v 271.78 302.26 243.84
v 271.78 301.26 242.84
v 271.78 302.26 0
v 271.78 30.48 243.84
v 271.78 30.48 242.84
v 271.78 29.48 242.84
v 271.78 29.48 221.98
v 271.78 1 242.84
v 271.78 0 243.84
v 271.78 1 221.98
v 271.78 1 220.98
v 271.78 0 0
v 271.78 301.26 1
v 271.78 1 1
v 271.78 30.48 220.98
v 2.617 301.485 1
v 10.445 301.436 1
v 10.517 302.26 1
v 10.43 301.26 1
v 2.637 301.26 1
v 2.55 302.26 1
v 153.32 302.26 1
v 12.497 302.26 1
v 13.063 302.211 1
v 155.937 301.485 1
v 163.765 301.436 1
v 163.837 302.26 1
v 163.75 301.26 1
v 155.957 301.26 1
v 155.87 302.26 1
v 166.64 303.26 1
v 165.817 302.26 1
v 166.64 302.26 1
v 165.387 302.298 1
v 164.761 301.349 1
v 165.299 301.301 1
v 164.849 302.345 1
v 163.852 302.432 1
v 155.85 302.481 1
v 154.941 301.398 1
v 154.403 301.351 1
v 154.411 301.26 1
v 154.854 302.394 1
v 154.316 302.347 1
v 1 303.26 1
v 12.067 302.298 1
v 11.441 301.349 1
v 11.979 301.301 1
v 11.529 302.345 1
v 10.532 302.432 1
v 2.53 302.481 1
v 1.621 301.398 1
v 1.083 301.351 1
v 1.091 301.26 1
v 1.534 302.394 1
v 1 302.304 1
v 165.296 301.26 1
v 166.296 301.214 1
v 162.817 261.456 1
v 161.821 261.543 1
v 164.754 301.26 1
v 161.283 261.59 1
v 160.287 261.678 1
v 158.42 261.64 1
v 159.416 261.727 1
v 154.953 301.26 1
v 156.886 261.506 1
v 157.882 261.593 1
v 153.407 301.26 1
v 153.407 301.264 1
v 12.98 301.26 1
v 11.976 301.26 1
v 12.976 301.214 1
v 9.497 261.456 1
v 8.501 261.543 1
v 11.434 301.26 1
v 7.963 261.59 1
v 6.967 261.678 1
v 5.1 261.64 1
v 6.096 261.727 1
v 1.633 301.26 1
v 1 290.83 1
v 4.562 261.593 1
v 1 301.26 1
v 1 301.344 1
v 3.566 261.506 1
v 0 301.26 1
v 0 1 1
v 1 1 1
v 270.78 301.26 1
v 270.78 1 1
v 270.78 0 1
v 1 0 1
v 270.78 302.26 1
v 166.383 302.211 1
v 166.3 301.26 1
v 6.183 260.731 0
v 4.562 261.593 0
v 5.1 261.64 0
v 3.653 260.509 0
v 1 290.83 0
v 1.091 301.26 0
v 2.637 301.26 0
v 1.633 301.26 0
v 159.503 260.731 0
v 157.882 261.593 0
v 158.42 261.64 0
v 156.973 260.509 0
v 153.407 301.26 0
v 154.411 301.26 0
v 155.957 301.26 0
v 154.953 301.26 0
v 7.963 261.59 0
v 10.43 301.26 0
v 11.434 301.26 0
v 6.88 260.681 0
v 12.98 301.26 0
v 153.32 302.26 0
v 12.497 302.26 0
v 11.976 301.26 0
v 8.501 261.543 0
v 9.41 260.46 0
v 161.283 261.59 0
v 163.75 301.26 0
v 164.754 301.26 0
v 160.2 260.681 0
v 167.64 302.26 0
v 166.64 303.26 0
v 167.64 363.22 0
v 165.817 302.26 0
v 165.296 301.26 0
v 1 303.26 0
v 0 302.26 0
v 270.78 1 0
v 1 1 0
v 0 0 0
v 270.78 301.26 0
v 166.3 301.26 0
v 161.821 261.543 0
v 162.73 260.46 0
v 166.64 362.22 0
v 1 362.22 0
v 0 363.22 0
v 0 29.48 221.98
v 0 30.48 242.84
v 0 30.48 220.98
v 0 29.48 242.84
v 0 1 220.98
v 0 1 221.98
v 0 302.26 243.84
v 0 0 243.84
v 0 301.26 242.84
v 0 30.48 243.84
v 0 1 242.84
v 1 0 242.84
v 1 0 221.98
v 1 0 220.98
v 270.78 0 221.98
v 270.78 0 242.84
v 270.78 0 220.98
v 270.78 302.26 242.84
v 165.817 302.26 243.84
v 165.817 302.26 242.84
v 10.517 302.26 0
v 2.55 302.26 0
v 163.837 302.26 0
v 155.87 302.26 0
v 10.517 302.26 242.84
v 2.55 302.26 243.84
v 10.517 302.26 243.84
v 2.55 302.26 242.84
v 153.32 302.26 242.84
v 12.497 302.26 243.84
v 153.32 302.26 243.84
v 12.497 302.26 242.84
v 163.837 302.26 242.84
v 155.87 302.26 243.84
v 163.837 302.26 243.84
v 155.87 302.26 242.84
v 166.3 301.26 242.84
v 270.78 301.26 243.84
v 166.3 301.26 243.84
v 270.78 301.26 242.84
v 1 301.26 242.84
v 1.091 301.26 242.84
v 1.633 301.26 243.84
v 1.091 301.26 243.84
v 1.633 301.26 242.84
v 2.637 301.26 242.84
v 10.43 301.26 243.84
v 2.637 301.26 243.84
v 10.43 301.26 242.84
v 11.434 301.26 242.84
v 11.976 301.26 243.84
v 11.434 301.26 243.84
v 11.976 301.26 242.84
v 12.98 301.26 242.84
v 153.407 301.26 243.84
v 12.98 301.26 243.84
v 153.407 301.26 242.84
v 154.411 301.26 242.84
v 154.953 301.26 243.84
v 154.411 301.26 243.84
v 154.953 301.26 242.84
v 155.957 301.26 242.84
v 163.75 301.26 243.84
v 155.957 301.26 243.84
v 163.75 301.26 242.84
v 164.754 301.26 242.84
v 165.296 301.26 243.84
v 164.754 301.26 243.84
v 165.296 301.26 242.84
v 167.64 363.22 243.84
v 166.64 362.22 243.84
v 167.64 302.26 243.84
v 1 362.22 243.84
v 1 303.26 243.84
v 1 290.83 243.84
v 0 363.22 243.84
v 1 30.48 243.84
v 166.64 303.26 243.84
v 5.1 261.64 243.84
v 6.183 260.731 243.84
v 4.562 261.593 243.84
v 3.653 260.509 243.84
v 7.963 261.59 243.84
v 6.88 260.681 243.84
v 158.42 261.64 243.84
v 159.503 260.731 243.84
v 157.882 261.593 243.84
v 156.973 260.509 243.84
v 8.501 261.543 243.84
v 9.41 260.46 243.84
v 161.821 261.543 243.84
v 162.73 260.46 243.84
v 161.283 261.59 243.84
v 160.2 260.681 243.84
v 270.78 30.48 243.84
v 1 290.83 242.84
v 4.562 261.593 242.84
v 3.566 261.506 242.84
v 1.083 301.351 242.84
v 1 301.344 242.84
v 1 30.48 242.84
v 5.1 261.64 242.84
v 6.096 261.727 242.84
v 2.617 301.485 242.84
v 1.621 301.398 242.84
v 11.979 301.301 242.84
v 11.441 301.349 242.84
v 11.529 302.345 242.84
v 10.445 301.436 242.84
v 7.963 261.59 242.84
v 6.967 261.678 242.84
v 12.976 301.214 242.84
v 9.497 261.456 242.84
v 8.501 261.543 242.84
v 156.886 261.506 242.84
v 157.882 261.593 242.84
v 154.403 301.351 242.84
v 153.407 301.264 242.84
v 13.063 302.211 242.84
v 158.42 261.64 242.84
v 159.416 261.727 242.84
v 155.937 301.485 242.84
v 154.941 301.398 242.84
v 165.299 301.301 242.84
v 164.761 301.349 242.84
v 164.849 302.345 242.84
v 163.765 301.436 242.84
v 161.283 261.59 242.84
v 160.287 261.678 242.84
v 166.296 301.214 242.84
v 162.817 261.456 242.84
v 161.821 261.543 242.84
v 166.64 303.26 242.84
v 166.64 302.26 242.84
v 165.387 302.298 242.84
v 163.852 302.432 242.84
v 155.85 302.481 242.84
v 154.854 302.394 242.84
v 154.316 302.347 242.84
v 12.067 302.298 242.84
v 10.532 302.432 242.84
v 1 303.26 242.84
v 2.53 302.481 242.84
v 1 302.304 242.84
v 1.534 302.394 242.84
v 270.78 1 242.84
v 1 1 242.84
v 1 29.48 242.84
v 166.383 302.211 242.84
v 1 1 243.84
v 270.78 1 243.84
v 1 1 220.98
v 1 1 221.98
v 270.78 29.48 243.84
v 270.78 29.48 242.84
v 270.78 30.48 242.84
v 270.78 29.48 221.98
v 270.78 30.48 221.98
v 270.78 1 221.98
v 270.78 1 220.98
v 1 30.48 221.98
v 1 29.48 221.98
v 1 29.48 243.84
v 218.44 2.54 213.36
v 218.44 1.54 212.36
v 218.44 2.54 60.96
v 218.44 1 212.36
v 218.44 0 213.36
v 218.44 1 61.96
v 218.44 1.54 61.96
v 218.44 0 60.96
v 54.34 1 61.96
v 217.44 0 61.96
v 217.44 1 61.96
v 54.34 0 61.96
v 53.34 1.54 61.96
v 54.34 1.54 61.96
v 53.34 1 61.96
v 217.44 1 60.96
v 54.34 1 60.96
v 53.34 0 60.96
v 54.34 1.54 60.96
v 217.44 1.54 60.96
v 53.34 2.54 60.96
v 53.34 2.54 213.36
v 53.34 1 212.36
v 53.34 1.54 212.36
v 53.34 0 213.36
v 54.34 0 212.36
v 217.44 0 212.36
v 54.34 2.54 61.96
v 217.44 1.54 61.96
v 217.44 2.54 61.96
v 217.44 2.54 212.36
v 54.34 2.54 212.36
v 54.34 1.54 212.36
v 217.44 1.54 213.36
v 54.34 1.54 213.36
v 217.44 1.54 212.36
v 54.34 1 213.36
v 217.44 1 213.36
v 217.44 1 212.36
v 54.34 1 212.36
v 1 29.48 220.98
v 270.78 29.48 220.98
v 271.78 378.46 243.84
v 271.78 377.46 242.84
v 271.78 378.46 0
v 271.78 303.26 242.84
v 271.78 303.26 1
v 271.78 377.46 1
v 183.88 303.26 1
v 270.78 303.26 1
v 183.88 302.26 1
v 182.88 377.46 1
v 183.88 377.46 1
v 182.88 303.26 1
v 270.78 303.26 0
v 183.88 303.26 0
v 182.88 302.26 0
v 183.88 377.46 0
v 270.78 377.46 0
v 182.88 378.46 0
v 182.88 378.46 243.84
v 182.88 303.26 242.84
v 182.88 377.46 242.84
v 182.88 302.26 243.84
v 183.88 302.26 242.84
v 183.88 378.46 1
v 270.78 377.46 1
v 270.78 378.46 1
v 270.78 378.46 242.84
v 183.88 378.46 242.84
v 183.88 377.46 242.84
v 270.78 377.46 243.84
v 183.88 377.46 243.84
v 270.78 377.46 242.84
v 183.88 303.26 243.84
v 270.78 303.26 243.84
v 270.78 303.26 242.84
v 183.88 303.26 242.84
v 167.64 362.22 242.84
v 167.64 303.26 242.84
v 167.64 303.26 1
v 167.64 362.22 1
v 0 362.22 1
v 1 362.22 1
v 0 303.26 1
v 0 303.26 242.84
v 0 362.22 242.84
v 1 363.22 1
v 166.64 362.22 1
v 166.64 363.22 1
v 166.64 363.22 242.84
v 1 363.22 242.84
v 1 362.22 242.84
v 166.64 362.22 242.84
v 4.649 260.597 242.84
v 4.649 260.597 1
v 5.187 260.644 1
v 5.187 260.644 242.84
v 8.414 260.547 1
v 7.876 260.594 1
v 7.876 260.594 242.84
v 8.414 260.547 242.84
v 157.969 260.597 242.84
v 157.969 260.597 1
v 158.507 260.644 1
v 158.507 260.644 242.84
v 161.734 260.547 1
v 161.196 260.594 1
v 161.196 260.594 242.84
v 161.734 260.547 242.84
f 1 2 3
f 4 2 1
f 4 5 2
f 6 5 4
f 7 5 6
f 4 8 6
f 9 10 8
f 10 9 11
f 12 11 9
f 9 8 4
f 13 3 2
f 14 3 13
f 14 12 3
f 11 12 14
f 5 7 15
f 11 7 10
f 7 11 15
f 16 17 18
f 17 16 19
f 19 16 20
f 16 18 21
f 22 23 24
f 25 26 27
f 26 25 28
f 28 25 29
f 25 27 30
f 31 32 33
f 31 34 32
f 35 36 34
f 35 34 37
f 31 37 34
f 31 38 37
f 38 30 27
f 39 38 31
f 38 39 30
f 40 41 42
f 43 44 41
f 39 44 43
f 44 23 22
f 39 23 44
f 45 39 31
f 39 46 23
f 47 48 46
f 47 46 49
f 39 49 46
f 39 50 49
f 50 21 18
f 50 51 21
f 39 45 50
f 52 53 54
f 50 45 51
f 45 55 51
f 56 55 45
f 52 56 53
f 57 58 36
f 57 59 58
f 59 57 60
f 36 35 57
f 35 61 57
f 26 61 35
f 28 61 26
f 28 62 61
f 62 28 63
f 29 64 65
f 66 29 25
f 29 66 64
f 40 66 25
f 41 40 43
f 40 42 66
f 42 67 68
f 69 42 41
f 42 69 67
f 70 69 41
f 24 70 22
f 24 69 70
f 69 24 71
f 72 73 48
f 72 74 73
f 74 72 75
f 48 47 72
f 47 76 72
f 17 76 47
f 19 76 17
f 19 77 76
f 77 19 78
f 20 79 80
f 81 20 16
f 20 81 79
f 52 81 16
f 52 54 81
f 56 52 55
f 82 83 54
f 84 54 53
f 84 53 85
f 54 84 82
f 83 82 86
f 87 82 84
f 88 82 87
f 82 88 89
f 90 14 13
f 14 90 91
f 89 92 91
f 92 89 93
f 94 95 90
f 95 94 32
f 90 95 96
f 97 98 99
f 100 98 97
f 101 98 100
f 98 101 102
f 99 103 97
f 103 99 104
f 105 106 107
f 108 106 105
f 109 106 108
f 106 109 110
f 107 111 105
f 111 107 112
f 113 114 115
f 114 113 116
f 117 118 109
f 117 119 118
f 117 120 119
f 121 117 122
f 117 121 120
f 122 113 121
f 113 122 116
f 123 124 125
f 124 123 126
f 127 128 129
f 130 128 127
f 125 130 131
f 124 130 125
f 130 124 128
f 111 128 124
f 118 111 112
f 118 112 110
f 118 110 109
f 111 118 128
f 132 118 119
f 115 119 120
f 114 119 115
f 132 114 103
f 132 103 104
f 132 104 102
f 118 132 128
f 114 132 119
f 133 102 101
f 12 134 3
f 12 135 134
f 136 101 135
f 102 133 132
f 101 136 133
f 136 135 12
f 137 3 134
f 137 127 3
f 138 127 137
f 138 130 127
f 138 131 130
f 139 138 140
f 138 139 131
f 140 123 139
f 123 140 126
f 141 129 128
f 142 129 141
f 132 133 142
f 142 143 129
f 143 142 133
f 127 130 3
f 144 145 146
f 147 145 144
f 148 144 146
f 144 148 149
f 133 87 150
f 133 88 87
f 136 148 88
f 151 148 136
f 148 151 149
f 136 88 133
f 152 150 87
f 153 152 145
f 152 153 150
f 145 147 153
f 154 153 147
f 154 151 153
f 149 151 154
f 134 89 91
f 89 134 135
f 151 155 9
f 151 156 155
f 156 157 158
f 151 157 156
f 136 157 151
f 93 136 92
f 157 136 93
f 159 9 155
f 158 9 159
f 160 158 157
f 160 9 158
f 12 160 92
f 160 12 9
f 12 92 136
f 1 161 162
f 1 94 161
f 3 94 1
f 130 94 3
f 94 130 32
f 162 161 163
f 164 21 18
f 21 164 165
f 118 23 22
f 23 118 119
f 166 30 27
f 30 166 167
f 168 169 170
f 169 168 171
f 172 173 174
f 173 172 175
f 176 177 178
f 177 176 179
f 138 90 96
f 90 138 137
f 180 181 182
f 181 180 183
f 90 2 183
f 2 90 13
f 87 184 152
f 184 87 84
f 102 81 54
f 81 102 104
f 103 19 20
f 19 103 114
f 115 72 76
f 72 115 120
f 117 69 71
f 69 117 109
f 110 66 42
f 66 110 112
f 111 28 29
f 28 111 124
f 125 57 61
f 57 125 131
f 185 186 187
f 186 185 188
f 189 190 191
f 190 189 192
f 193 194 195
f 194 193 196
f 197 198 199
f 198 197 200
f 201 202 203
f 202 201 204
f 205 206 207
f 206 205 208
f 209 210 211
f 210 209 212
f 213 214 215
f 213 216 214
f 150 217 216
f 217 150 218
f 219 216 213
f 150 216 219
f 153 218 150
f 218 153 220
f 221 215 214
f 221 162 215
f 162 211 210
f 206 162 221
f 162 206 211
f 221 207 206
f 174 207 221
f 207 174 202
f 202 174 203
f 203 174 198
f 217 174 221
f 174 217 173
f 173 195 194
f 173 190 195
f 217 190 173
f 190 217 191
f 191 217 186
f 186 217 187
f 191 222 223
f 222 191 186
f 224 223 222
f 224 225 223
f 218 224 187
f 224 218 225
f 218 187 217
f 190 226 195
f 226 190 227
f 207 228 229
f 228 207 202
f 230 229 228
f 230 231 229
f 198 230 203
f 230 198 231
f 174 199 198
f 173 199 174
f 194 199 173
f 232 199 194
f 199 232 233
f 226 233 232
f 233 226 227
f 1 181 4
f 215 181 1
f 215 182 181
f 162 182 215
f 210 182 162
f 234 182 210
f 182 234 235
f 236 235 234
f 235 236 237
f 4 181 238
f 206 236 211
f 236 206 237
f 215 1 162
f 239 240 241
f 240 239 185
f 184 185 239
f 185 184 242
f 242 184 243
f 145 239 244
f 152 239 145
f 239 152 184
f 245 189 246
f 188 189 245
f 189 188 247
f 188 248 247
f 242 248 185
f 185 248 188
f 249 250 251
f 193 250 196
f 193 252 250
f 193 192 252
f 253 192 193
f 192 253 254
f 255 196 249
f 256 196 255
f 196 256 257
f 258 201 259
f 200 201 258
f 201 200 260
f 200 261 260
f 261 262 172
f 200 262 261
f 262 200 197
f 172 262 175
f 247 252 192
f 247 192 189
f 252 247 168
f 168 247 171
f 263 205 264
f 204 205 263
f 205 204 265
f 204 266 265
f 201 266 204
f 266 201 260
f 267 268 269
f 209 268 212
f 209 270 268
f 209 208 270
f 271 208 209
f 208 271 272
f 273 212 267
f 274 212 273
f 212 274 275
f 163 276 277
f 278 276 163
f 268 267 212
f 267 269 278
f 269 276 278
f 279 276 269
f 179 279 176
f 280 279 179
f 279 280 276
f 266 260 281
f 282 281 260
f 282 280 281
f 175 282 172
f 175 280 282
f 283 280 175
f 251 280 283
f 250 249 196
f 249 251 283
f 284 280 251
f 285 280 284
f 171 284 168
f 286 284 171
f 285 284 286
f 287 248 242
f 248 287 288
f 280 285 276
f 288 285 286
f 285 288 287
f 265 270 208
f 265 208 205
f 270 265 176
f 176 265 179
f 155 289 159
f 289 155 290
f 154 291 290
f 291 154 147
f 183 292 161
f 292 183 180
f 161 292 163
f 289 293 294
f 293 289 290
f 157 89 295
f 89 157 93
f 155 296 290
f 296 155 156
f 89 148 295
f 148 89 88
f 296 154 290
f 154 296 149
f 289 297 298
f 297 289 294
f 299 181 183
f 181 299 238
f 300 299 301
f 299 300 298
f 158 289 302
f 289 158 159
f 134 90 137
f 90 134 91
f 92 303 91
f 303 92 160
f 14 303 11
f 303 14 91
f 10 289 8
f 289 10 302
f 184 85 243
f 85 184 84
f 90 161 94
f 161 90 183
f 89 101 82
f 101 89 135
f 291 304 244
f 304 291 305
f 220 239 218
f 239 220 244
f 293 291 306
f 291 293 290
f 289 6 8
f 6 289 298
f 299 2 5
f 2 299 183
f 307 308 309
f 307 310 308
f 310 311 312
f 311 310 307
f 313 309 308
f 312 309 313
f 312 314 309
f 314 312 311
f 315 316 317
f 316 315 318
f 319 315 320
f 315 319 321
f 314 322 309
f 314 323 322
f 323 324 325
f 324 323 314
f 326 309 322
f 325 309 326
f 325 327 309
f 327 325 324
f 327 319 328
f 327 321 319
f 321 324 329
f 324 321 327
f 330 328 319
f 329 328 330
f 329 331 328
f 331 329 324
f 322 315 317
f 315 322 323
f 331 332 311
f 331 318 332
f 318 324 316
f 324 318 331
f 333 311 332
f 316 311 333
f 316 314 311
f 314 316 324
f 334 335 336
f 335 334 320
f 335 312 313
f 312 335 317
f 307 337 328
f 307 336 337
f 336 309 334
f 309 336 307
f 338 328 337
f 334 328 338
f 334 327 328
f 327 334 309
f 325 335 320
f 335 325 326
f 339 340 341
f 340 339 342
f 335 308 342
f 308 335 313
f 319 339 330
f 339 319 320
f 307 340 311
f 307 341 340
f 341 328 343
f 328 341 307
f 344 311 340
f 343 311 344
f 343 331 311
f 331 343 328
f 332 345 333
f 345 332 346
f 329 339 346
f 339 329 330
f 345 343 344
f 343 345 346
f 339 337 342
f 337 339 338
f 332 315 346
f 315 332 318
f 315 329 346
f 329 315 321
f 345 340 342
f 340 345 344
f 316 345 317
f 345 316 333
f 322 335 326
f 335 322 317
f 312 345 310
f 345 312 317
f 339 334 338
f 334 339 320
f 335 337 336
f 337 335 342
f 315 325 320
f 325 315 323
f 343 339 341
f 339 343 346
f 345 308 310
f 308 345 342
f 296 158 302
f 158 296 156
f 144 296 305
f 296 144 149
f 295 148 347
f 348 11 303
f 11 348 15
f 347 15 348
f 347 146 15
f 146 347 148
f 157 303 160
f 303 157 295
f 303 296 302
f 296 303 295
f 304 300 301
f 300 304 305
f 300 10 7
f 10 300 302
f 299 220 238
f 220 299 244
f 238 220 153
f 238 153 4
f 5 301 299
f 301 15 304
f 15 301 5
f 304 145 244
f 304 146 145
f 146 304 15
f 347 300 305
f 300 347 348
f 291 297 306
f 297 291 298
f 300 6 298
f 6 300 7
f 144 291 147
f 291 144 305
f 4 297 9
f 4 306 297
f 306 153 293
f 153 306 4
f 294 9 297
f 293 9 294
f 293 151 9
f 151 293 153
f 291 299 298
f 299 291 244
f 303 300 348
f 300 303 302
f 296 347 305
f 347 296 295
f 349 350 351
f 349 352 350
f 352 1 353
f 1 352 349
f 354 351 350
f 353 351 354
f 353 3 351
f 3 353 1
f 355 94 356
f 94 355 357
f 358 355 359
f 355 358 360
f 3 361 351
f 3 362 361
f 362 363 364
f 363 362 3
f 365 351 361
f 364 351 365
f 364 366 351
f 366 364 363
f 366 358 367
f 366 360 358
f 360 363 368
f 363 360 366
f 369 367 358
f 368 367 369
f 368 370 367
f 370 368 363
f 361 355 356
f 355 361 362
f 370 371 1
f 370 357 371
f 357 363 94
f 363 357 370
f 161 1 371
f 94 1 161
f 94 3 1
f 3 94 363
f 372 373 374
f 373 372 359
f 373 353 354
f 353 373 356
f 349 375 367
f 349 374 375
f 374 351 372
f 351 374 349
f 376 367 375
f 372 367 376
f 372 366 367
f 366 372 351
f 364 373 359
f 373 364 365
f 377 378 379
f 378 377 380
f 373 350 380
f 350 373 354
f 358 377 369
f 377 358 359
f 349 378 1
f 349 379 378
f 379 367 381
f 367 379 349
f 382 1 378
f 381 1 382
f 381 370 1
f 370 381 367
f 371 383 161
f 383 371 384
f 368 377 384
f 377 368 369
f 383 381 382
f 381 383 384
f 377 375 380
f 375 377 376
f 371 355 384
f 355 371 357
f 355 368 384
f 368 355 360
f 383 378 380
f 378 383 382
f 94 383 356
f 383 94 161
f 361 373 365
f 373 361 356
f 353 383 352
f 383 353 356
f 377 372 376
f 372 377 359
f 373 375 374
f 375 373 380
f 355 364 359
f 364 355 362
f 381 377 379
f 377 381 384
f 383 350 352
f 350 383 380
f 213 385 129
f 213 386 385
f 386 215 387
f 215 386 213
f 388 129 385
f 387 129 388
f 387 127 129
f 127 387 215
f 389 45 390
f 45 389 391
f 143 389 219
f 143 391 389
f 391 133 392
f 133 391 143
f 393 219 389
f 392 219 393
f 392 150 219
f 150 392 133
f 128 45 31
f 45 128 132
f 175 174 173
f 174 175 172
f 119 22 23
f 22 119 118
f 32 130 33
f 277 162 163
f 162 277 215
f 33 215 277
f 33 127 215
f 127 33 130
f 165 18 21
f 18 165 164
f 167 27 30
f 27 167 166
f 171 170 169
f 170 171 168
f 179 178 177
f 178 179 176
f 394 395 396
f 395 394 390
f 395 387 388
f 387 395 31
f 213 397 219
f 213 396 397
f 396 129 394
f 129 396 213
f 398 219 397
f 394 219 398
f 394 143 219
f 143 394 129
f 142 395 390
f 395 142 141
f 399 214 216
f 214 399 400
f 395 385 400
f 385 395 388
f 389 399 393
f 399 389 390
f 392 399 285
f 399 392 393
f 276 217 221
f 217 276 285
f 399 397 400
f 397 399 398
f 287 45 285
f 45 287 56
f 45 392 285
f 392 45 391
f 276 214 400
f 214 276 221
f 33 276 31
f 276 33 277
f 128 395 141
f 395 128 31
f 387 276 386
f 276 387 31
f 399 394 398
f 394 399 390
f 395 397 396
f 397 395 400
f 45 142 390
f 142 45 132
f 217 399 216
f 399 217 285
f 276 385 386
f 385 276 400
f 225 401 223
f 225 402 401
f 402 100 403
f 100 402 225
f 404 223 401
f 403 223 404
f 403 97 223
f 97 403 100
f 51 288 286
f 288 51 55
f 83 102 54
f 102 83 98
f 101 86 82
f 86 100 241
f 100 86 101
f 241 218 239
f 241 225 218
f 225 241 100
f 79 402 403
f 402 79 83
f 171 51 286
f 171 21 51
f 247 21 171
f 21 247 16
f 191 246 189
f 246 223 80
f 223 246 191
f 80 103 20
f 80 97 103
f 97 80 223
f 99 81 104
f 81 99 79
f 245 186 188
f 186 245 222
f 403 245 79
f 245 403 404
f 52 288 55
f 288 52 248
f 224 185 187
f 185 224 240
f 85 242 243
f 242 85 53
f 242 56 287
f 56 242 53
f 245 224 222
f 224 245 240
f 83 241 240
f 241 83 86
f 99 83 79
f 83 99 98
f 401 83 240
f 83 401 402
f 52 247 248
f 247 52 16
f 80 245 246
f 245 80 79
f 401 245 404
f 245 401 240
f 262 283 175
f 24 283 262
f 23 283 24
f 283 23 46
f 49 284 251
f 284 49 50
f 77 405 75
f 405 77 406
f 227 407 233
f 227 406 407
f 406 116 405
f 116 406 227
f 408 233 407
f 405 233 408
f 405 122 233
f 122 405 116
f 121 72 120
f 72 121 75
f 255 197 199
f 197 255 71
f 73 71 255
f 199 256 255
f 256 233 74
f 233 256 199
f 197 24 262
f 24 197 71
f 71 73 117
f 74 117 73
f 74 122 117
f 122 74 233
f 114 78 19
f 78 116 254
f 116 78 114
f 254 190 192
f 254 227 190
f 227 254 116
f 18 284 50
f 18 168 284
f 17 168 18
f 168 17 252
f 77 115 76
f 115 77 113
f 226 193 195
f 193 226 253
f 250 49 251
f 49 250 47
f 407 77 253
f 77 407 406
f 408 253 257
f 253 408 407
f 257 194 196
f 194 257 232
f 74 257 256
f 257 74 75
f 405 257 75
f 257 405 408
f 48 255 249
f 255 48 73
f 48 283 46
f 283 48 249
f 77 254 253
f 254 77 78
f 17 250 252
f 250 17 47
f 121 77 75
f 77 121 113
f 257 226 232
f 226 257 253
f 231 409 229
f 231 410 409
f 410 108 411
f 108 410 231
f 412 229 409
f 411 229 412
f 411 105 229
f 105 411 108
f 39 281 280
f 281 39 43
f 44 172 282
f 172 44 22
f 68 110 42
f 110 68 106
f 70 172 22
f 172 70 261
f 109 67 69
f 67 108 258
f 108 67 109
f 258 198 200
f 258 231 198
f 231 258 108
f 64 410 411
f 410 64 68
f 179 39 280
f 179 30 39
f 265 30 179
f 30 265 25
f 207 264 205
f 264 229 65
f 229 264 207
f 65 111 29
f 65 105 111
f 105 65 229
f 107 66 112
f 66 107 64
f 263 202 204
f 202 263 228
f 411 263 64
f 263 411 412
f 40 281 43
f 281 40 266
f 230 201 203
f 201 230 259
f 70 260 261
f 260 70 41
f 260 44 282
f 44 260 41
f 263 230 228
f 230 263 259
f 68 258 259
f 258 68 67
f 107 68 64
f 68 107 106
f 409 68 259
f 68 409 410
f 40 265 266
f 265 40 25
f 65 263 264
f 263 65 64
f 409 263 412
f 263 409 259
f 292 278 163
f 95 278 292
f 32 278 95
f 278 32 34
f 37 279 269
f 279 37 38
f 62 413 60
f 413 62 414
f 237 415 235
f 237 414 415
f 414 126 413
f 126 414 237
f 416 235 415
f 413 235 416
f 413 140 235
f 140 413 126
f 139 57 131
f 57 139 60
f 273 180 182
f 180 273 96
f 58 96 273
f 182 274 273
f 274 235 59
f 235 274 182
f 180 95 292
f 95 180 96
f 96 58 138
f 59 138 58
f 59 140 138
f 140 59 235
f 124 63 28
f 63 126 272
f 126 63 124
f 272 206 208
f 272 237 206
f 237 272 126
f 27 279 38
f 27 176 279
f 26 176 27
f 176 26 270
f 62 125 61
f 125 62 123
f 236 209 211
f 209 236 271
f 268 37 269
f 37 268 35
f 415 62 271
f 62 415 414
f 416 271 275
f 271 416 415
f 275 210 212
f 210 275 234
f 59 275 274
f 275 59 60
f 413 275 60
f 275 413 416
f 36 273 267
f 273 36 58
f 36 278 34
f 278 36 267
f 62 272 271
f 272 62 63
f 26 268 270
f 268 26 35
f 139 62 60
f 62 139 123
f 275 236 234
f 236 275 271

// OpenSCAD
// file: functions.scad
function in(i) = i * 2.54;
function ft(f, i=0) = in(f*12+i);
// main file
include <functions.scad>;

room_x = ft(8,11);
room_y = ft(9,11);
room_z = ft(8);

shelves_x = room_x - in(2);
shelves_y = room_y - in(2);
shelves_z = room_z - in(2);

wireframe_t = 1;

closet_x = 1.375;

module closet_door() {
    wireframe_cube([ft(closet_x), in(1), room_z], wireframe_t);
}

module wireframe_cube(vect, wireframe_t=5) {
    room_x = vect[0];
    room_y = vect[1];
    room_z = vect[2];

    // along the x axis (short dimension of the room)
    cube([room_x, wireframe_t, wireframe_t]);
    
    translate([0,room_y-wireframe_t,0])
    cube([room_x, wireframe_t, wireframe_t]);

    translate([0,0,room_z-wireframe_t])
    cube([room_x, wireframe_t, wireframe_t]);
    
    translate([0,room_y-wireframe_t,room_z-wireframe_t])
    cube([room_x, wireframe_t, wireframe_t]);

    // verticals
    cube([wireframe_t, wireframe_t, room_z]);
    
    translate([room_x-wireframe_t, 0, 0])
    cube([wireframe_t, wireframe_t, room_z]);
    
    translate([0, room_y-wireframe_t, 0])
    cube([wireframe_t, wireframe_t, room_z]);
    
    translate([room_x-wireframe_t, room_y-wireframe_t, 0])
    cube([wireframe_t, wireframe_t, room_z]);
    
    // along the y axis (long dimension of the room)
    
    cube([wireframe_t, room_y, wireframe_t]);
    
    translate([0, 0, room_z-wireframe_t])
    cube([wireframe_t, room_y, wireframe_t]);

    translate([room_x-wireframe_t, 0, room_z-wireframe_t])
    cube([wireframe_t, room_y, wireframe_t]);
    
    translate([room_x-wireframe_t, 0, 0])
    cube([wireframe_t, room_y, wireframe_t]);
}

module room_wireframe() {
    // room
    wireframe_cube([room_x, room_y, room_z], wireframe_t);
    
    // window
    translate([ft(1.75),0,ft(2)])
    wireframe_cube([ft(5,5), in(1), ft(5)], wireframe_t);
    
    // above window
    translate([0,0,room_z-in(9)])
    wireframe_cube([room_x, ft(1), in(9)], wireframe_t);
    

    // entry
    translate([room_x-ft(2,11),room_y,0])
    wireframe_cube([ft(2,11),ft(2,6),ft(8)], wireframe_t);

    // closet
    translate([0,room_y,0])
    wireframe_cube([ft(5,6),ft(2),ft(8)], wireframe_t);


    translate([0,room_y,0]) {
        rotate([0,0,-85])
        closet_door();
        
        translate([ft(closet_x)*1-32.5,-41.8,0])
        rotate([0,0,85])
        closet_door();
        
        
        translate([ft(closet_x)*2+69.5,0,0])
        rotate([0,0,-85])
        closet_door();
        
        translate([ft(closet_x)*3+37,-41.8,0])
        rotate([0,0,85])
        closet_door();
    }
    
}



room_wireframe();
